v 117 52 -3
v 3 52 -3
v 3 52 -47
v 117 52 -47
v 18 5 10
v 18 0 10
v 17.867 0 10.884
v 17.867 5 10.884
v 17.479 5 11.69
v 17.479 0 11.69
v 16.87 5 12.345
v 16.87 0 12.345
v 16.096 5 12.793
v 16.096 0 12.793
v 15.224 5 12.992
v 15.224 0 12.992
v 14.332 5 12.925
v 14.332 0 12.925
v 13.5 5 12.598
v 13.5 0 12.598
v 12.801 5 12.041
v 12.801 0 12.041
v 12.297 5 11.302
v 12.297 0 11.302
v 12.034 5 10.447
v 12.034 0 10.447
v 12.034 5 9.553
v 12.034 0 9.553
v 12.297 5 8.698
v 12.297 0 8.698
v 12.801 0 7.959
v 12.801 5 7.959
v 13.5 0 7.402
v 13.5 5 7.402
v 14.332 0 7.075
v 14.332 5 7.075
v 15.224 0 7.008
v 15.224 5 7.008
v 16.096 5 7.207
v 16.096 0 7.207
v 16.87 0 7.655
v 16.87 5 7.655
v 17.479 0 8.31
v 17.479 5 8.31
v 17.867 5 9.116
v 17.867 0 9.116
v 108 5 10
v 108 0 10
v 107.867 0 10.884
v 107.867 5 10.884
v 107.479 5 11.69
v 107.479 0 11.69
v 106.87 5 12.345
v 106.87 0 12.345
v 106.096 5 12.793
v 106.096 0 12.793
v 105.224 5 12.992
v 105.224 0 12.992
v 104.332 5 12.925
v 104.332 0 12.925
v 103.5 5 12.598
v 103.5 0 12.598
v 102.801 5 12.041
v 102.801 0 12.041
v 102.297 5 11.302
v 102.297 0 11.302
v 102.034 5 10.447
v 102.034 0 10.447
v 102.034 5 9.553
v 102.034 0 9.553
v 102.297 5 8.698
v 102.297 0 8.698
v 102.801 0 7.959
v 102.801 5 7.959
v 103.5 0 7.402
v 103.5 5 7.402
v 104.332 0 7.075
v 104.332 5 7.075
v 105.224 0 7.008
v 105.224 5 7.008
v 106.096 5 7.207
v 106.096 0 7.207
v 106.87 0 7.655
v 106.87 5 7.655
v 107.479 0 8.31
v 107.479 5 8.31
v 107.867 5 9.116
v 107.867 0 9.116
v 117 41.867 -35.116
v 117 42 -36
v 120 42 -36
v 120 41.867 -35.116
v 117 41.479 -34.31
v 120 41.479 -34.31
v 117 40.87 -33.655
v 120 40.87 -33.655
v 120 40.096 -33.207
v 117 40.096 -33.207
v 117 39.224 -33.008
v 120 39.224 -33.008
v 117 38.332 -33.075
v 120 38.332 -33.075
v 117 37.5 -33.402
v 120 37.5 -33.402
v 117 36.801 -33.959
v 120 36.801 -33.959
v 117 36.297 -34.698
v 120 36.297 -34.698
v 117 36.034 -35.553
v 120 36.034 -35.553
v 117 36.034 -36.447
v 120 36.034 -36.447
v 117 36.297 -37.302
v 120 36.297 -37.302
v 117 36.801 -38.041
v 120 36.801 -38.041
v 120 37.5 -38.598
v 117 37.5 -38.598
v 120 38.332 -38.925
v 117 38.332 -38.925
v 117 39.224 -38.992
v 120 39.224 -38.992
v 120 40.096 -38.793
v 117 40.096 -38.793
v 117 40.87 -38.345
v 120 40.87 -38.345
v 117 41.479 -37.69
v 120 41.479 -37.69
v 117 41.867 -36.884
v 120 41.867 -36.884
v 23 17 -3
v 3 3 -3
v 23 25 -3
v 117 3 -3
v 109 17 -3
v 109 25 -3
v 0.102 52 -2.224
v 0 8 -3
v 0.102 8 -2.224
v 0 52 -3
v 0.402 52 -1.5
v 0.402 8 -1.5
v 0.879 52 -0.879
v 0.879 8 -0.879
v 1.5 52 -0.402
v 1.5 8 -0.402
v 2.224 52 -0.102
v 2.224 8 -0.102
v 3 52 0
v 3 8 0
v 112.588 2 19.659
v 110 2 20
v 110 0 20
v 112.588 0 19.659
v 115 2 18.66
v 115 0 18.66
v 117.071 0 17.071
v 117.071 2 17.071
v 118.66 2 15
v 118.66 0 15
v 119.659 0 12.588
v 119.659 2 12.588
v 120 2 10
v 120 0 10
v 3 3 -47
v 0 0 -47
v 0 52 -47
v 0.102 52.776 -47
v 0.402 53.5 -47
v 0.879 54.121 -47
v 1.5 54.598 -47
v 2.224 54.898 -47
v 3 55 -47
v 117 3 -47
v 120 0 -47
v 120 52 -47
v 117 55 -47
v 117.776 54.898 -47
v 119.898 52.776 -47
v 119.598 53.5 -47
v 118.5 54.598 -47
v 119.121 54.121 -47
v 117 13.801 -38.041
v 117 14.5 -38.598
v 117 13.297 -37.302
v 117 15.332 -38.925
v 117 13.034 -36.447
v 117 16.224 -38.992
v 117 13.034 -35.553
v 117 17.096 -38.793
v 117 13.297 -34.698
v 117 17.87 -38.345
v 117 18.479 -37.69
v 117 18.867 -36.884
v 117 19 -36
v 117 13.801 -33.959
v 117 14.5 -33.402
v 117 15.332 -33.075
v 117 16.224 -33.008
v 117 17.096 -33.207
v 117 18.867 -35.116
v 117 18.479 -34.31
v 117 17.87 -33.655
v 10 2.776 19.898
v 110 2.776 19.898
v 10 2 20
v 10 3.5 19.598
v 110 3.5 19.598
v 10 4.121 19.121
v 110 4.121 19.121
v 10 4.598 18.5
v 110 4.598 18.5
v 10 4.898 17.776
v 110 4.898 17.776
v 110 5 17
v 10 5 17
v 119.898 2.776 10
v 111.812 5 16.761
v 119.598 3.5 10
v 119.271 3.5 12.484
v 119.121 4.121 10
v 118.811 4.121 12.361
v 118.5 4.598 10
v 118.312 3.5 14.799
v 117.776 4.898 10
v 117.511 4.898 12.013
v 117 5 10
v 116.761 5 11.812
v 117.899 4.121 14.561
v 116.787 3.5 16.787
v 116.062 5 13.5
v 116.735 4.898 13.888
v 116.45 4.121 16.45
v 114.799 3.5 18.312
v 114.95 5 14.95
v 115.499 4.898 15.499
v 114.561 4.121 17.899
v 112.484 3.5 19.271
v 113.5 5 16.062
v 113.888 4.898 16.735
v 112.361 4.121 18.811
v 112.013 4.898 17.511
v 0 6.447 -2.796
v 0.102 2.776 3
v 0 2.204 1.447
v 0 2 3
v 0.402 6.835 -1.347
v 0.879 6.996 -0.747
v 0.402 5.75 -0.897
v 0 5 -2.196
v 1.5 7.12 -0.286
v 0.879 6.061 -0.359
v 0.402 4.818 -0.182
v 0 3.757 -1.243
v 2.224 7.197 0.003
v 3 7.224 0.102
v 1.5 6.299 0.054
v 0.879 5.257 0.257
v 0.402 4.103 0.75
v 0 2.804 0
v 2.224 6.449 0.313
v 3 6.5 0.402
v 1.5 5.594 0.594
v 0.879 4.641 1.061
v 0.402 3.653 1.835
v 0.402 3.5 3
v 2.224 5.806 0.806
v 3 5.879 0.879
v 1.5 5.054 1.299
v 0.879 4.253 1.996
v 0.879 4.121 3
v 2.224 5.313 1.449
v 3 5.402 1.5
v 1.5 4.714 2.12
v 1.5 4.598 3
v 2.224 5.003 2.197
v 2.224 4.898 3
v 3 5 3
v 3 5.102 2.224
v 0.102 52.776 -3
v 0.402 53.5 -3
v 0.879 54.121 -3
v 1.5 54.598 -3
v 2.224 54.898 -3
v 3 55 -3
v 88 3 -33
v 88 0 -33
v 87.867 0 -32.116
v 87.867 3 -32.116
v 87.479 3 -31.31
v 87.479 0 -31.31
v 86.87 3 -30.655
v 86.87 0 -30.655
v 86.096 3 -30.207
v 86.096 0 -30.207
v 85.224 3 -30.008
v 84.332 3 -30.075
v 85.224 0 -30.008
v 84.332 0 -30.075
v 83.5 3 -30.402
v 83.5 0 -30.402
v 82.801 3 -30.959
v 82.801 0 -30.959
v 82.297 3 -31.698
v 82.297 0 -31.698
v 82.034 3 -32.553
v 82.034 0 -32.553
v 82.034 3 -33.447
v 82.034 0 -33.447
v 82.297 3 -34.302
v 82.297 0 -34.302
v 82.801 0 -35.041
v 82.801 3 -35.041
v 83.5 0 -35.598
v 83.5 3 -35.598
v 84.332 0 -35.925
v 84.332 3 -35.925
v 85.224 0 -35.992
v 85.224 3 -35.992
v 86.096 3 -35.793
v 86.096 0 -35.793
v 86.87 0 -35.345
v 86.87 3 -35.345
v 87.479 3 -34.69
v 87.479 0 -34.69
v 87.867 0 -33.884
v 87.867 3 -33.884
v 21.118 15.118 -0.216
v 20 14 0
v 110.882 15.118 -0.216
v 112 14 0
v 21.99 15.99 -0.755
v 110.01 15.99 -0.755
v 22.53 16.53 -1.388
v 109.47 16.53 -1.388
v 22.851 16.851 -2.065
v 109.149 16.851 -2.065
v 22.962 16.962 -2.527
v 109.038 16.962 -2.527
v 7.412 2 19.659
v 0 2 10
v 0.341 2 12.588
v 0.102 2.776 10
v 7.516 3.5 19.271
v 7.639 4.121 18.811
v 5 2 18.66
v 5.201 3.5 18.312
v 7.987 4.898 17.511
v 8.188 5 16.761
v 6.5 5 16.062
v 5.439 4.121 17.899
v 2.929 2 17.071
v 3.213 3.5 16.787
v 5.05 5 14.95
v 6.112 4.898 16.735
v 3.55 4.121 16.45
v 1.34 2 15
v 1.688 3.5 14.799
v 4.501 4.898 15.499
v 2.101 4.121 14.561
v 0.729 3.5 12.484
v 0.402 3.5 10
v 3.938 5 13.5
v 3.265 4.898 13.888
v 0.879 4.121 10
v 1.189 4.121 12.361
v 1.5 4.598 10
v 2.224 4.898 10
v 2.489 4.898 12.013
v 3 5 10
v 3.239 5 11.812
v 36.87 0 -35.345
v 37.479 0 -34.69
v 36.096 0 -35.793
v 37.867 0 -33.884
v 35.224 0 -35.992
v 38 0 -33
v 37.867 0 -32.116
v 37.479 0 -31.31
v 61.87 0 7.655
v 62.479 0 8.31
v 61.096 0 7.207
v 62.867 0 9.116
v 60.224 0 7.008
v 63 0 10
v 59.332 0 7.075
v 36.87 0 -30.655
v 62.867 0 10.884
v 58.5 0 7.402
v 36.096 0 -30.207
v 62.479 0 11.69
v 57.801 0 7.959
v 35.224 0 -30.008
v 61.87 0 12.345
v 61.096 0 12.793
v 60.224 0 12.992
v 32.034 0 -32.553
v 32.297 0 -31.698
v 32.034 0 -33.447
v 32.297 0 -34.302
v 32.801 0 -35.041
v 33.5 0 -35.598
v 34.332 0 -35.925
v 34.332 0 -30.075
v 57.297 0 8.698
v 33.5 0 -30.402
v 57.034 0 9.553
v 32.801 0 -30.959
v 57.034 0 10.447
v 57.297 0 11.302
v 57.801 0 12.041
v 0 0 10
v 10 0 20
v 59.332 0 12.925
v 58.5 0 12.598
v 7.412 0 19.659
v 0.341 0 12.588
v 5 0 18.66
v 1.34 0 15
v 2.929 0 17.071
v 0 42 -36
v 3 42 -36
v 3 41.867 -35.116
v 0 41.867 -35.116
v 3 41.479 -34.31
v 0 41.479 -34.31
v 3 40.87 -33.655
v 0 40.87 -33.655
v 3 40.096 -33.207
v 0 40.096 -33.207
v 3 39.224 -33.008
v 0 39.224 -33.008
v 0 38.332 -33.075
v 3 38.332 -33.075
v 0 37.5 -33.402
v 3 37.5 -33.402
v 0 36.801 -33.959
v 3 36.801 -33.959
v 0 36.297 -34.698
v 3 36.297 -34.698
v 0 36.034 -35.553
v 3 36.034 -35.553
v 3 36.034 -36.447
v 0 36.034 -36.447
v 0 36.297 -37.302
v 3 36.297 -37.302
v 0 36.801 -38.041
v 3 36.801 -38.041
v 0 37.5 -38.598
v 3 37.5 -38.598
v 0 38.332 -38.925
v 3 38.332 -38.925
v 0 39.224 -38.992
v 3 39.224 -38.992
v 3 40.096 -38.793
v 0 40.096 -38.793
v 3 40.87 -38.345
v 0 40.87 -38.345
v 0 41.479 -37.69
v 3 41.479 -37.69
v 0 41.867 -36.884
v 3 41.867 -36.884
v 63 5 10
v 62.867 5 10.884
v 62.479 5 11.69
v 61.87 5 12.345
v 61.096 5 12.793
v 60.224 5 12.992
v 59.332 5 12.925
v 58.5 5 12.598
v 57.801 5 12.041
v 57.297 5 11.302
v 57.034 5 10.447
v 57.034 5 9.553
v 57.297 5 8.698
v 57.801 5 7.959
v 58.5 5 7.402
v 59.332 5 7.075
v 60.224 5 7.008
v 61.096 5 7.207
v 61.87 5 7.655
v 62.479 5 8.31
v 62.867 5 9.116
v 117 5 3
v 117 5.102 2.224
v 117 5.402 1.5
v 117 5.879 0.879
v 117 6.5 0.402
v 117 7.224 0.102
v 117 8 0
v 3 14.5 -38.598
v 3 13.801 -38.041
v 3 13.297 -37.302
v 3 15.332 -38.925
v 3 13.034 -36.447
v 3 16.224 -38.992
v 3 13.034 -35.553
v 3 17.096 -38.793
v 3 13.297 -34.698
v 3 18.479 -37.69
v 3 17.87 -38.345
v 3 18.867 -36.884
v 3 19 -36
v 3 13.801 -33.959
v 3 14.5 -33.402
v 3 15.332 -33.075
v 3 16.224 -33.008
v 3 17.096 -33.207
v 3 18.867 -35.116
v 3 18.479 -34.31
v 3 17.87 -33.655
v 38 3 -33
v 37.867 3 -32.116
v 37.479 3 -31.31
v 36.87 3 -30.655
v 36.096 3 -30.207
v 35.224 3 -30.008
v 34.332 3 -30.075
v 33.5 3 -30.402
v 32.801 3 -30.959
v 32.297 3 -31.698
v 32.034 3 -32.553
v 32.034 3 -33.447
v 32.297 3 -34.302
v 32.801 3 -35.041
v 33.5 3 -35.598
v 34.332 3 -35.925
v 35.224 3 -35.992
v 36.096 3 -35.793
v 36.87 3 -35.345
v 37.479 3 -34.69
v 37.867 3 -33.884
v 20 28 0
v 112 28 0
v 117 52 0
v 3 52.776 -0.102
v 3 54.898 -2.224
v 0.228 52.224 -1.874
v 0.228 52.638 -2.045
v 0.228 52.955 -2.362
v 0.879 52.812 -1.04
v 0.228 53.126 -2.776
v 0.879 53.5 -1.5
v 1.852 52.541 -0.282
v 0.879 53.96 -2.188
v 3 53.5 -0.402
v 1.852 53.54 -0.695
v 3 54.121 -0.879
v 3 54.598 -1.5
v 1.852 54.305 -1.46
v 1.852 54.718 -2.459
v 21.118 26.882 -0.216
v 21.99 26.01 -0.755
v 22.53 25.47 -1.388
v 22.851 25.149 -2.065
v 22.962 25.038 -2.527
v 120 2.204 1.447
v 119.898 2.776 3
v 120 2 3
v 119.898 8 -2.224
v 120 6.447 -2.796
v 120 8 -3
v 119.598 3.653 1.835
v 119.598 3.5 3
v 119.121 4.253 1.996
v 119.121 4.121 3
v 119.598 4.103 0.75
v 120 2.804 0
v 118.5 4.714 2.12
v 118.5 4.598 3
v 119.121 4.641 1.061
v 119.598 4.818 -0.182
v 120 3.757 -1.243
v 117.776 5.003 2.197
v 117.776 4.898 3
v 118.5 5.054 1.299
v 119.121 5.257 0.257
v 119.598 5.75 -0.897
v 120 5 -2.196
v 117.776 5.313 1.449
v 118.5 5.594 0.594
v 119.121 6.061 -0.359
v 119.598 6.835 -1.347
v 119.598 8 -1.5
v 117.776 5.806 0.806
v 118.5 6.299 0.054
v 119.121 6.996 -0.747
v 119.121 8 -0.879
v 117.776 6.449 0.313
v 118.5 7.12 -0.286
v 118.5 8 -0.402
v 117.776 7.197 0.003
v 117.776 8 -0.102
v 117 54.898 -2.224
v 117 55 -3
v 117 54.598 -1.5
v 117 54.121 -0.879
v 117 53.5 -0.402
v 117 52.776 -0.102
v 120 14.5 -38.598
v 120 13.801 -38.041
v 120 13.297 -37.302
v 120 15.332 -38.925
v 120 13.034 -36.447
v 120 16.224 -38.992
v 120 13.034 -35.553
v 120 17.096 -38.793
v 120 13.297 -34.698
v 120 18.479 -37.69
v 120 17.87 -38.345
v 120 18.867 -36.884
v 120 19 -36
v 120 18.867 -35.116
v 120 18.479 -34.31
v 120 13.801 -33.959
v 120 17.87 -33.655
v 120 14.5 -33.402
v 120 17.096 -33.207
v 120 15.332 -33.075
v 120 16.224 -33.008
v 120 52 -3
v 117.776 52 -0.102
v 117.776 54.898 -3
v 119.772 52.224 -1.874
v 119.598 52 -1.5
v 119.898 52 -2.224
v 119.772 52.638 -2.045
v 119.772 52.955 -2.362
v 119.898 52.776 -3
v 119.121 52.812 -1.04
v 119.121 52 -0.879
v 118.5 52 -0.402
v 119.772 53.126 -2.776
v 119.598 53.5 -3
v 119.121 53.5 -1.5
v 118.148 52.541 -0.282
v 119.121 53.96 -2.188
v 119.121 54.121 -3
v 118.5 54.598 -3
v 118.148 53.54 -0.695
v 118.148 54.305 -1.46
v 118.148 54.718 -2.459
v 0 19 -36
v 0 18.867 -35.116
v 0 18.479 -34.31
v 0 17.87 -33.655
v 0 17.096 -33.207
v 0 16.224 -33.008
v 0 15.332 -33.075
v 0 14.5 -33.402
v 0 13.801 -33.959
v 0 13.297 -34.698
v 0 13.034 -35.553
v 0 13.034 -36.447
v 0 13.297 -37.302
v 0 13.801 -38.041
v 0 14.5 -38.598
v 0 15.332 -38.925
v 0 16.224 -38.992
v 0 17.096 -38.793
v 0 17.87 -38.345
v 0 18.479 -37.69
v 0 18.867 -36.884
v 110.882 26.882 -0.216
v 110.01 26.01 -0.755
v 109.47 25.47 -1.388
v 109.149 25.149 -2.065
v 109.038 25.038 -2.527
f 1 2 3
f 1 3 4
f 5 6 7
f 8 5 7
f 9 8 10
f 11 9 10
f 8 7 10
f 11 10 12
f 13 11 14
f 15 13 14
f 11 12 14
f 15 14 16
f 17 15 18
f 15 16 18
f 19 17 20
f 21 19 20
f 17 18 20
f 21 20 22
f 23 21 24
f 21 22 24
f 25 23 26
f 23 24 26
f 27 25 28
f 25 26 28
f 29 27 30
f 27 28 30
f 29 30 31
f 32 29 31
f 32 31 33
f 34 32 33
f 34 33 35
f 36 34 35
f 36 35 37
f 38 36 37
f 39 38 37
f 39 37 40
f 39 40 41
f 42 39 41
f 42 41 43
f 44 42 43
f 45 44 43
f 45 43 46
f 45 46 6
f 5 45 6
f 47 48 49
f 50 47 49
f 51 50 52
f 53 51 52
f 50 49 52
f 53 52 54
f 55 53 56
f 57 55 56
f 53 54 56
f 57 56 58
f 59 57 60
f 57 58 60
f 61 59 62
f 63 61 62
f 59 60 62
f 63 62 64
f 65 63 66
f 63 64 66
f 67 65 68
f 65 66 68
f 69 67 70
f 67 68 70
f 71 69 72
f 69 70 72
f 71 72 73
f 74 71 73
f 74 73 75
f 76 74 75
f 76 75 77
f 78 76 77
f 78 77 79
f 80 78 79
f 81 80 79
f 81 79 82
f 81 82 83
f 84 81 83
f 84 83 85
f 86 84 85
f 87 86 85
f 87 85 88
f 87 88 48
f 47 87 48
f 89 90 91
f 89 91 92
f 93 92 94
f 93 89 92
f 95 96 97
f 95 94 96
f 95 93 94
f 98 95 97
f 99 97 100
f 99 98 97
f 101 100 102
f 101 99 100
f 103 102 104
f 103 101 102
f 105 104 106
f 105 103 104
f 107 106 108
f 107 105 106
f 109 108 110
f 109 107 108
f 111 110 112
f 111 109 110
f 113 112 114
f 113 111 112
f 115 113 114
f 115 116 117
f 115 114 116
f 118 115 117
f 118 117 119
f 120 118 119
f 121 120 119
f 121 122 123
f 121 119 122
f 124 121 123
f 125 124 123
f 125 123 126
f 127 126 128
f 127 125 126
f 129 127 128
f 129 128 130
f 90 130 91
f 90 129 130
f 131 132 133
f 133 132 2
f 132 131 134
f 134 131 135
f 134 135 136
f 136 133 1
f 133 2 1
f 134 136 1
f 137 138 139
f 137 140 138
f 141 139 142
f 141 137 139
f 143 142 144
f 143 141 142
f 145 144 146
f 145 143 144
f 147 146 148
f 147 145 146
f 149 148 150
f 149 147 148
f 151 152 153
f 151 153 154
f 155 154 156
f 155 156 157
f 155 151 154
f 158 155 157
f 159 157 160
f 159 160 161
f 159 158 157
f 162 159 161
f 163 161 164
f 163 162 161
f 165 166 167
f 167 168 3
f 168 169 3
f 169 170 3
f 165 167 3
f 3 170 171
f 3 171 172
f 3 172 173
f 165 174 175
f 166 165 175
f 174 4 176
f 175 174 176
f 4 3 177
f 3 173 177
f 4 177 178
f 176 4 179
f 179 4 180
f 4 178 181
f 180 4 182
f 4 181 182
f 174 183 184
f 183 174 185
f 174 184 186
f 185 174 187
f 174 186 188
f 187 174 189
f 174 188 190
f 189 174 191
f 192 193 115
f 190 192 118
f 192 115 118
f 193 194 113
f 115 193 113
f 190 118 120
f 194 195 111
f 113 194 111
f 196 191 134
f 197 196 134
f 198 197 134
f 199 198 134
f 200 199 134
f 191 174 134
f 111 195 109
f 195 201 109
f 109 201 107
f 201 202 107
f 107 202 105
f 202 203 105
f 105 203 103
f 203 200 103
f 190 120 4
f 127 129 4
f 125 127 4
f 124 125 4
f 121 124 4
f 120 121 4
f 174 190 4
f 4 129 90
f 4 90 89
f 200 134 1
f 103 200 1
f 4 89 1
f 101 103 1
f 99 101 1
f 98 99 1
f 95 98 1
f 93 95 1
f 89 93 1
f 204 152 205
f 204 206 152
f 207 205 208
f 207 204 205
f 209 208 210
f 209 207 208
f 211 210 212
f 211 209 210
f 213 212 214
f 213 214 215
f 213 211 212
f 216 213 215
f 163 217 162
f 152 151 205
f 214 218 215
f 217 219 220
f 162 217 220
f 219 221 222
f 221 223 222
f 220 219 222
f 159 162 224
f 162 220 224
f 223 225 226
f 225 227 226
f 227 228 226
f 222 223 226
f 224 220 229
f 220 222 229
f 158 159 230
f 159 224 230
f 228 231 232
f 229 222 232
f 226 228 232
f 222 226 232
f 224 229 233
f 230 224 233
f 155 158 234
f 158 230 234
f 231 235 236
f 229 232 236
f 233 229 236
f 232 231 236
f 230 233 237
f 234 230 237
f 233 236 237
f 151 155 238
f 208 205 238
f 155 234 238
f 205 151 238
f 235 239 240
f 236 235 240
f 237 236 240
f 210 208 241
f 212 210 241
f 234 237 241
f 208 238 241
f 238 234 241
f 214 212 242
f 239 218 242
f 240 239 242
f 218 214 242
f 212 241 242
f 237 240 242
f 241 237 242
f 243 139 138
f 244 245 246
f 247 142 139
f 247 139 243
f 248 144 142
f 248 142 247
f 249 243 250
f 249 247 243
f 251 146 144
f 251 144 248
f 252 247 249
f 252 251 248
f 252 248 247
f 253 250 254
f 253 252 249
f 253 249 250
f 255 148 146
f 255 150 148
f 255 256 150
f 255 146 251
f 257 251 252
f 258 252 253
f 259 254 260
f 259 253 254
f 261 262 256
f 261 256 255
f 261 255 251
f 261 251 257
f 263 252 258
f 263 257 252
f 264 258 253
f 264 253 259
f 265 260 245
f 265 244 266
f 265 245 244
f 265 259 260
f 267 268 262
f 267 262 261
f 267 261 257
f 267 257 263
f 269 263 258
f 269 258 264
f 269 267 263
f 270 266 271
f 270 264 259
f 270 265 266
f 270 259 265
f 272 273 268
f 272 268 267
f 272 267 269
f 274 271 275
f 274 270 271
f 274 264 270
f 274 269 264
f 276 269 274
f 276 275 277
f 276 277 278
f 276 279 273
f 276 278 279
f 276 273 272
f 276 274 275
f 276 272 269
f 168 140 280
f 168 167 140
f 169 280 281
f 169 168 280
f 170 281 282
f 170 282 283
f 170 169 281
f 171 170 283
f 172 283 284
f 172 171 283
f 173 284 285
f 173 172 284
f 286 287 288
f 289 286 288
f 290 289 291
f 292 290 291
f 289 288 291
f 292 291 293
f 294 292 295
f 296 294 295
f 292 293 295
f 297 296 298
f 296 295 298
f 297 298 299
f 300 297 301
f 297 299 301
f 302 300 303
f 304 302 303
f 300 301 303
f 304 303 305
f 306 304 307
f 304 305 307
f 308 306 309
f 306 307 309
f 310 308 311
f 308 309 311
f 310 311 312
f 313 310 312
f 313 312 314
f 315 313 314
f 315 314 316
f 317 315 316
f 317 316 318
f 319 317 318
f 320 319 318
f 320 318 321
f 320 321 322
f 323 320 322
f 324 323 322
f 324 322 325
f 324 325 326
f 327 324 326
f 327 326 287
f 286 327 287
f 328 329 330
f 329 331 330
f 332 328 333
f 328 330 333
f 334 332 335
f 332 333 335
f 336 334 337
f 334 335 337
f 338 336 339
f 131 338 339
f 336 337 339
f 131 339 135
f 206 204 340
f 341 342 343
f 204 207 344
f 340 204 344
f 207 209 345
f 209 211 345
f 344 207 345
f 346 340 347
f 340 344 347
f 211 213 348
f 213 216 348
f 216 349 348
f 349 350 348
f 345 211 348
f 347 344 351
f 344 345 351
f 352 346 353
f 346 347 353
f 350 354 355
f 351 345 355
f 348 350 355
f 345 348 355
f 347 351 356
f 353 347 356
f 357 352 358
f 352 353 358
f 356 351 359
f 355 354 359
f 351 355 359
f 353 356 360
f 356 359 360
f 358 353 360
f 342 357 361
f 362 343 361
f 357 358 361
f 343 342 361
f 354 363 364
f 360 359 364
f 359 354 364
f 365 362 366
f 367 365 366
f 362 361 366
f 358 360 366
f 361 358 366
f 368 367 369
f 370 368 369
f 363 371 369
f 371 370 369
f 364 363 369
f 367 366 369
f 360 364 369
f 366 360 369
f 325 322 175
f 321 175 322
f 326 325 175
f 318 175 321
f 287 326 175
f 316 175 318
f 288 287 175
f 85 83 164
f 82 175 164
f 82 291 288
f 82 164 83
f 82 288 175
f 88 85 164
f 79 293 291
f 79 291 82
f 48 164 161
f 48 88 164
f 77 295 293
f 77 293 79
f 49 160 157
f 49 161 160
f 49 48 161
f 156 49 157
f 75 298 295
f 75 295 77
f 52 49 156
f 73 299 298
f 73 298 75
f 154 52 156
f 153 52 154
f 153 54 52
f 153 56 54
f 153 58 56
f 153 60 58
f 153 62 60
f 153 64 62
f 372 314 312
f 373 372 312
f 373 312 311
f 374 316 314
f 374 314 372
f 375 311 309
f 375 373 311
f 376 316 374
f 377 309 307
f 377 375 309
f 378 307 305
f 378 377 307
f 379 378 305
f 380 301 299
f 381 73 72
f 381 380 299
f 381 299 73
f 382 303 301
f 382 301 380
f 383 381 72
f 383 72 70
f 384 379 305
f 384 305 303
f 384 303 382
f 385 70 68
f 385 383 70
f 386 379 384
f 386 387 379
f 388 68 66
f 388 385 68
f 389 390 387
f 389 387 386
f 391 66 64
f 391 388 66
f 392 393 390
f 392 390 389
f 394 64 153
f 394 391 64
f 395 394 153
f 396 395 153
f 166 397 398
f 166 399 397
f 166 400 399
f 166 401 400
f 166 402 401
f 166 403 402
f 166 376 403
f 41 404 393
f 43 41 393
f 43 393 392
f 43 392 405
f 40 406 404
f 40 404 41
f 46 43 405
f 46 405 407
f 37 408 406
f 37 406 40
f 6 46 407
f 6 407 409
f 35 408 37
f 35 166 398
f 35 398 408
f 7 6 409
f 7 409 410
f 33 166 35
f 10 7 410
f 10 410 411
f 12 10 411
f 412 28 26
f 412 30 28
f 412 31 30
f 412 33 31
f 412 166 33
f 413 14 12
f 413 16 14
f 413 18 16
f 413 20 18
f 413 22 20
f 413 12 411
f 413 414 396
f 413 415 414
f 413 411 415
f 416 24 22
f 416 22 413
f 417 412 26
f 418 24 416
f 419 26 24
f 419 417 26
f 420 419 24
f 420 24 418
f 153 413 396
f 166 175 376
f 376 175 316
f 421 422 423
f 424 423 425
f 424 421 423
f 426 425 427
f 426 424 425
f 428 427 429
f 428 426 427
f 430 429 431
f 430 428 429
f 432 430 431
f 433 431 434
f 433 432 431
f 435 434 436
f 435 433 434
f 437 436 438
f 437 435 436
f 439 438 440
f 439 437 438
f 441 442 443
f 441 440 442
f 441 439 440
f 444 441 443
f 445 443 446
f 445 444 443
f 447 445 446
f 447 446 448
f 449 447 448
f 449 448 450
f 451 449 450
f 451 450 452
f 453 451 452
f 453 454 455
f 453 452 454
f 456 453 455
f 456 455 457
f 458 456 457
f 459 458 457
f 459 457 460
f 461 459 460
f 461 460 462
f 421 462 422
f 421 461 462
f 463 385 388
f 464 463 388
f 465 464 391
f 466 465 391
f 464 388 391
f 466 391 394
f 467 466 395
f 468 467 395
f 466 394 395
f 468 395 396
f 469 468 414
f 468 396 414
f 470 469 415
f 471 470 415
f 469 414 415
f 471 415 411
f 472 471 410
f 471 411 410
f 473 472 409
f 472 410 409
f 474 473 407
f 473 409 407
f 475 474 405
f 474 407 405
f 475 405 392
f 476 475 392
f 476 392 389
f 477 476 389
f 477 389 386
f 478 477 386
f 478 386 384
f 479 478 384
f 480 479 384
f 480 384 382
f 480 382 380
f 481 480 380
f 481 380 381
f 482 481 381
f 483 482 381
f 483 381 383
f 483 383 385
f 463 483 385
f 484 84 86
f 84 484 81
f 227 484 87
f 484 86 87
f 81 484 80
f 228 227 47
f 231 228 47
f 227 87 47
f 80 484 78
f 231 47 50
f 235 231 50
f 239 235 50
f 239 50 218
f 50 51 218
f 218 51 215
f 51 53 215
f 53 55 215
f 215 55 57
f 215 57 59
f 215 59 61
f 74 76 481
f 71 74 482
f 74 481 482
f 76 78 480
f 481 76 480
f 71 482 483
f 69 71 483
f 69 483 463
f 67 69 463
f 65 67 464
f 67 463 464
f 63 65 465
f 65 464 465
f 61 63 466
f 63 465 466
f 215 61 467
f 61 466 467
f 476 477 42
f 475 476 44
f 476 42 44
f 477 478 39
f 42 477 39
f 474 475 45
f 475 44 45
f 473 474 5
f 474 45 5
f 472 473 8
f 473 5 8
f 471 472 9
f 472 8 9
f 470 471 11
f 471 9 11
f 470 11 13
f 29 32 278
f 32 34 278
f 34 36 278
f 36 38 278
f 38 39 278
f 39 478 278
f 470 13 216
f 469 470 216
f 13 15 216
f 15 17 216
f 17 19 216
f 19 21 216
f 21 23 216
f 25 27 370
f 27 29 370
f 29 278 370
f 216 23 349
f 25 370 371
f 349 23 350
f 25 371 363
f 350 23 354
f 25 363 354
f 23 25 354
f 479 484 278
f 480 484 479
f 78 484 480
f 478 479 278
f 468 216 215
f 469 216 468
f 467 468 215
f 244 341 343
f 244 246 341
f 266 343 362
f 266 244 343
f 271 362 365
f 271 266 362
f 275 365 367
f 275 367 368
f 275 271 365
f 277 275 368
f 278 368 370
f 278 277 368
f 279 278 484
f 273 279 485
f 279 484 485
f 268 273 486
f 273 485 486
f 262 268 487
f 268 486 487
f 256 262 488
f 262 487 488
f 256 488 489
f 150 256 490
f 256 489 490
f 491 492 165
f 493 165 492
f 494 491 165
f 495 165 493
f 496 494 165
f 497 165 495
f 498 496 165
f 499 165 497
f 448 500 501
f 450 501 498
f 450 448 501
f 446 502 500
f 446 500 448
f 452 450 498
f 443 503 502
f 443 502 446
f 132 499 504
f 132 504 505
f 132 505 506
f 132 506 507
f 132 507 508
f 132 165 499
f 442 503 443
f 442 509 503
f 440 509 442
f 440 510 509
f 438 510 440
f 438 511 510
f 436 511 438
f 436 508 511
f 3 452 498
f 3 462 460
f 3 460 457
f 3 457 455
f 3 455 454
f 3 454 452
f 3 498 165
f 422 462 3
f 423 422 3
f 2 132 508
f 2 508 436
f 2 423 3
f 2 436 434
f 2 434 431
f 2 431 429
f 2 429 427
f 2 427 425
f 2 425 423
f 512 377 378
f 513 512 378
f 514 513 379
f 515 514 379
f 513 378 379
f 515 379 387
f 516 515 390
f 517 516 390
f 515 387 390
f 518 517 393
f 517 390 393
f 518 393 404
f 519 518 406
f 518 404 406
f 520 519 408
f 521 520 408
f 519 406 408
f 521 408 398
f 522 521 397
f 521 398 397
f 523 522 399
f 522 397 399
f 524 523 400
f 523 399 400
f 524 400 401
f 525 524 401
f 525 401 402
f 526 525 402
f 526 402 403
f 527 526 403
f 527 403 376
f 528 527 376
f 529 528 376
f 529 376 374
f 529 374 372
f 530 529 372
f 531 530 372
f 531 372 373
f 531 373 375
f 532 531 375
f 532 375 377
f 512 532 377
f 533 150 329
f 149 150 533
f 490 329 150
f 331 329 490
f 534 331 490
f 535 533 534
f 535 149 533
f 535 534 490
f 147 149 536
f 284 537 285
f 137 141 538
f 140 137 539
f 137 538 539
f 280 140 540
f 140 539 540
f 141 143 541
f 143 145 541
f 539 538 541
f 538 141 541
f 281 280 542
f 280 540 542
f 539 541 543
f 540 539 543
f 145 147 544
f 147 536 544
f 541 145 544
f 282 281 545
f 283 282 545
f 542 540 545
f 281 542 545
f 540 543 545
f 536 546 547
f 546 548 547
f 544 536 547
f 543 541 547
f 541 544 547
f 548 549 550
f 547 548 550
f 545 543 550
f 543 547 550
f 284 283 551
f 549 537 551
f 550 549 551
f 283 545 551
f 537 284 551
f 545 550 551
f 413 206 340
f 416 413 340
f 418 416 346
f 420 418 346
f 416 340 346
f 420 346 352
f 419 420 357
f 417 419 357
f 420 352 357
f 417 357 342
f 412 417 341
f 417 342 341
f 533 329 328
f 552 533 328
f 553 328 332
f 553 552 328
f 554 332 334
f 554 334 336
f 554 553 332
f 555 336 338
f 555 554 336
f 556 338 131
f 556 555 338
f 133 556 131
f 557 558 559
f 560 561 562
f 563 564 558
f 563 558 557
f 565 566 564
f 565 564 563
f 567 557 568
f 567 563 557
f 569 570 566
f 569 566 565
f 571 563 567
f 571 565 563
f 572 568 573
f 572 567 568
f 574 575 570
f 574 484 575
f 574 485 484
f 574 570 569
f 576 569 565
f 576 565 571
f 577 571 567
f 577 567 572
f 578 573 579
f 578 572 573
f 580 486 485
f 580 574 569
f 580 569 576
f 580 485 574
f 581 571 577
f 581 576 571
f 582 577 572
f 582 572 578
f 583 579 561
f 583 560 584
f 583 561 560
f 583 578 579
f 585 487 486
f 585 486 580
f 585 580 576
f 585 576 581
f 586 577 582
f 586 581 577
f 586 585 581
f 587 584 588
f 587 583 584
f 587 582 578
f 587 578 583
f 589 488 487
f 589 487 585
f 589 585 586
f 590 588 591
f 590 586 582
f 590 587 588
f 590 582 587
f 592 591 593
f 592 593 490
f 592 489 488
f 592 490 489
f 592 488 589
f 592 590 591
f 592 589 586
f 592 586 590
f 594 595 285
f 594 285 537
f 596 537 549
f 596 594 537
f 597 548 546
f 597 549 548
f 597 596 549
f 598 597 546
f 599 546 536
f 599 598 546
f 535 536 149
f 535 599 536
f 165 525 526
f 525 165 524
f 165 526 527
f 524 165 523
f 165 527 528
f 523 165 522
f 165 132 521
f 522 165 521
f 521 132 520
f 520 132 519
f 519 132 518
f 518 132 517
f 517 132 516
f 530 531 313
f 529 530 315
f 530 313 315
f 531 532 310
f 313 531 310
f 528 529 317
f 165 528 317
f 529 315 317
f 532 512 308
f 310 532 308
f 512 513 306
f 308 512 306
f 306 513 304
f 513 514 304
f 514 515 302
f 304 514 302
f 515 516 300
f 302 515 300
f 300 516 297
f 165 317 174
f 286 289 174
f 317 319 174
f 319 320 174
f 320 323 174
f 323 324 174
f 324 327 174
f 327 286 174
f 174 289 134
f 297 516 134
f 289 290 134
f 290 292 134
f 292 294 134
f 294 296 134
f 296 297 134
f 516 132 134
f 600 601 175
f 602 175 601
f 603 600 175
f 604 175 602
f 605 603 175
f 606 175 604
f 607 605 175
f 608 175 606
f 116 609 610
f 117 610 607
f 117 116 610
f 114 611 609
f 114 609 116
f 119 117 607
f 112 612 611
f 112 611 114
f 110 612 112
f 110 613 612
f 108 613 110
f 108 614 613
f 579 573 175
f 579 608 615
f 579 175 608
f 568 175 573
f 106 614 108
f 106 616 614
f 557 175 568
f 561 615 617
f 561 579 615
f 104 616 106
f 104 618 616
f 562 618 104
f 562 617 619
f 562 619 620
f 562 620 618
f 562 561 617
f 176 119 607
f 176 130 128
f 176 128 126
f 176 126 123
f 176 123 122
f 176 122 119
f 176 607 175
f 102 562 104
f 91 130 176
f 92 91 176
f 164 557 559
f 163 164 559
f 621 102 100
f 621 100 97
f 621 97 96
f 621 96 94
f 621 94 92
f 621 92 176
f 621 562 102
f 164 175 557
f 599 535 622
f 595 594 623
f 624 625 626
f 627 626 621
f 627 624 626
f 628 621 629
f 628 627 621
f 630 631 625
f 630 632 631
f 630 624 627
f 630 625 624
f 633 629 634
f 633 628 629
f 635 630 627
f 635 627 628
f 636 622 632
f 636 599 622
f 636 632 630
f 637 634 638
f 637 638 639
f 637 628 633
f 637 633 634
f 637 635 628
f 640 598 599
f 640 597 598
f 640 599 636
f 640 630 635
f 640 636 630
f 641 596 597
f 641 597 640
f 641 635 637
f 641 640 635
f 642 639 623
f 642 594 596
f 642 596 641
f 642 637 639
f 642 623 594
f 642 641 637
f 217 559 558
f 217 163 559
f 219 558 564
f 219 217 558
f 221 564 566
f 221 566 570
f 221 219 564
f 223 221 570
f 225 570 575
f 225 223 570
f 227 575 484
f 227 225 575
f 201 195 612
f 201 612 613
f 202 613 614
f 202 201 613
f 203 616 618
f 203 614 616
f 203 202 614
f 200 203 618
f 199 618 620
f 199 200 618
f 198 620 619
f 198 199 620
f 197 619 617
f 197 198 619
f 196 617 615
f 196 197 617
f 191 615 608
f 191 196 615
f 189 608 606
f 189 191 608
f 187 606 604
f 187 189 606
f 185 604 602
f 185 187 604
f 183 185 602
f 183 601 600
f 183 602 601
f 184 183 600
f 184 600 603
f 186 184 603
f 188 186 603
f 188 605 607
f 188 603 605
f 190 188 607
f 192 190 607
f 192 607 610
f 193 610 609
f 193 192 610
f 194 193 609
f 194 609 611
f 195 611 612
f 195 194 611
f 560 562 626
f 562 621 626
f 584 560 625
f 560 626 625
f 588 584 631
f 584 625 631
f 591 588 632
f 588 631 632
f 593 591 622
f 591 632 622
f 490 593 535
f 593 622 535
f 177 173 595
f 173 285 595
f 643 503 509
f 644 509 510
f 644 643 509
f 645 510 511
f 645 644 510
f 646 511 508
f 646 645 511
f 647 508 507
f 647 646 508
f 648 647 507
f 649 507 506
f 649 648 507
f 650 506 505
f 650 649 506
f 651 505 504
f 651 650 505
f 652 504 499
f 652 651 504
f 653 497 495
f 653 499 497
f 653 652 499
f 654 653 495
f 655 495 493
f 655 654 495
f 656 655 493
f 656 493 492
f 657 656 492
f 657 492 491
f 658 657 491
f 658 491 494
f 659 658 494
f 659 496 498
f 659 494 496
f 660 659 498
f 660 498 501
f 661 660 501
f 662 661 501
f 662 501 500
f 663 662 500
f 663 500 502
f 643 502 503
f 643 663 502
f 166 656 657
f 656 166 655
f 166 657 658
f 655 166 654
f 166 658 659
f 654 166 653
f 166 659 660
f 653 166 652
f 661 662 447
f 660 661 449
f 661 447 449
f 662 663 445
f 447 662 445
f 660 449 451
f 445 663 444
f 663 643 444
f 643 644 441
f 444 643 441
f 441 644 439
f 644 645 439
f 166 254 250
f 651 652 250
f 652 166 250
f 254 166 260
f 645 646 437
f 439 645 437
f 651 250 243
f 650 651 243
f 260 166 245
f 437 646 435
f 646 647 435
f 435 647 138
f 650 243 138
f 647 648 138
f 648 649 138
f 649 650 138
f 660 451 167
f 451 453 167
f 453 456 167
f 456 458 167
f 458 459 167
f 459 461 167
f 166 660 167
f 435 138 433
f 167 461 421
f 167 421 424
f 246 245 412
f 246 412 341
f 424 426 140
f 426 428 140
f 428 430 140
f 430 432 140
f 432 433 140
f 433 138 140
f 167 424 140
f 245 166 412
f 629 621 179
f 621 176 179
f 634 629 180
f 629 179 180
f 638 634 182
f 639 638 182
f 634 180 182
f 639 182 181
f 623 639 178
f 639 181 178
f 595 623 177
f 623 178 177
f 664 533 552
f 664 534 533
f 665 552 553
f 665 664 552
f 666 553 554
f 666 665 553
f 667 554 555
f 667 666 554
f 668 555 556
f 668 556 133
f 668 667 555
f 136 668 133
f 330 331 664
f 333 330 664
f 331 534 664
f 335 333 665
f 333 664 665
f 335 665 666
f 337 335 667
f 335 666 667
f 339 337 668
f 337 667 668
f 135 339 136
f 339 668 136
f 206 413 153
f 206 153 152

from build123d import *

# Parameters (mm, degrees)
F0_W      = 114
F0_H      = 49
F0_W_2    = 86
F0_H_2    = 8
F1_DEPTH  = 3
F0_W_3    = 120
F0_H_3    = 55
F2_DEPTH  = 47
F3_R      = 3
F4_DEPTH  = 130
F5_R      = 3
F6_DEPTH  = 10
F7_W      = 5
F7_H      = 20
F8_DEPTH  = 120
F9_R      = 3
F10_DEPTH = 25
F11_R     = 10
F12_R     = 2.99999


# Not quite as in the source:
# - a fillet or chamfer is up to 0.001 mm smaller than in the source, because OpenCascade refuses the exact size


with BuildPart() as f1:
    # F0 (on Top) → F1 (new body)
    with BuildSketch(Plane.XY):
        with Locations((60, 27.5)):
            Rectangle(F0_W, F0_H)
        with Locations((66, 21)):
            Rectangle(F0_W_2, F0_H_2, mode=Mode.SUBTRACT)
    extrude(amount=-F1_DEPTH)

    # F0 (on Top) → F2 (join)
    with BuildSketch(Plane.XY):
        with Locations((60, 27.5)):
            Rectangle(F0_W_3, F0_H_3)
        with Locations((60, 27.5)):
            Rectangle(F0_W, F0_H, mode=Mode.SUBTRACT)
    extrude(amount=-F2_DEPTH)

    # F3 (on Right) → F4 (cut)
    with BuildSketch(Plane.YZ):
        with Locations((39, -36)):
            Circle(F3_R)
        with Locations((16, -36)):
            Circle(F3_R)
    extrude(amount=F4_DEPTH, mode=Mode.SUBTRACT)

    # F5 (on Front) → F6 (cut)
    with BuildSketch(Plane.XZ):
        with Locations((35, -33)):
            Circle(F5_R)
        with Locations((85, -33)):
            Circle(F5_R)
    extrude(amount=-F6_DEPTH, mode=Mode.SUBTRACT)

    # F7 (on Right) → F8 (join)
    with BuildSketch(Plane.YZ):
        with Locations((2.5, 10)):
            Rectangle(F7_W, F7_H)
    extrude(amount=F8_DEPTH)

    # F9 (on Front) → F10 (cut)
    with BuildSketch(Plane.XZ):
        with Locations((15, 10)):
            Circle(F9_R)
        with Locations((60, 10)):
            Circle(F9_R)
        with Locations((105, 10)):
            Circle(F9_R)
    extrude(amount=-F10_DEPTH, mode=Mode.SUBTRACT)

    # F11
    f11_edges = [f1.edges().sort_by_distance(p)[0] for p in [
        (0, 2.5, 20),
        (120, 2.5, 20),
    ]]
    fillet(f11_edges, radius=F11_R)

    # F12 (radius 3 in the source; OpenCascade refuses exactly that, so slightly less here)
    f12_edges = [f1.edges().sort_by_distance(p)[0] for p in [
        (66, 17, 0),
        (60, 55, 0),
        (120, 30, 0),
        (60, 5, 0),
        (0, 30, 0),
        (109, 21, 0),
        (66, 25, 0),
        (23, 21, 0),
        (120, 55, -23.5),
        (0, 55, -23.5),
        (2.928932, 5, 17.071068),
        (60, 5, 20),
        (117.071068, 5, 17.071068),
    ]]
    fillet(f12_edges, radius=F12_R)


solid = f1.part
